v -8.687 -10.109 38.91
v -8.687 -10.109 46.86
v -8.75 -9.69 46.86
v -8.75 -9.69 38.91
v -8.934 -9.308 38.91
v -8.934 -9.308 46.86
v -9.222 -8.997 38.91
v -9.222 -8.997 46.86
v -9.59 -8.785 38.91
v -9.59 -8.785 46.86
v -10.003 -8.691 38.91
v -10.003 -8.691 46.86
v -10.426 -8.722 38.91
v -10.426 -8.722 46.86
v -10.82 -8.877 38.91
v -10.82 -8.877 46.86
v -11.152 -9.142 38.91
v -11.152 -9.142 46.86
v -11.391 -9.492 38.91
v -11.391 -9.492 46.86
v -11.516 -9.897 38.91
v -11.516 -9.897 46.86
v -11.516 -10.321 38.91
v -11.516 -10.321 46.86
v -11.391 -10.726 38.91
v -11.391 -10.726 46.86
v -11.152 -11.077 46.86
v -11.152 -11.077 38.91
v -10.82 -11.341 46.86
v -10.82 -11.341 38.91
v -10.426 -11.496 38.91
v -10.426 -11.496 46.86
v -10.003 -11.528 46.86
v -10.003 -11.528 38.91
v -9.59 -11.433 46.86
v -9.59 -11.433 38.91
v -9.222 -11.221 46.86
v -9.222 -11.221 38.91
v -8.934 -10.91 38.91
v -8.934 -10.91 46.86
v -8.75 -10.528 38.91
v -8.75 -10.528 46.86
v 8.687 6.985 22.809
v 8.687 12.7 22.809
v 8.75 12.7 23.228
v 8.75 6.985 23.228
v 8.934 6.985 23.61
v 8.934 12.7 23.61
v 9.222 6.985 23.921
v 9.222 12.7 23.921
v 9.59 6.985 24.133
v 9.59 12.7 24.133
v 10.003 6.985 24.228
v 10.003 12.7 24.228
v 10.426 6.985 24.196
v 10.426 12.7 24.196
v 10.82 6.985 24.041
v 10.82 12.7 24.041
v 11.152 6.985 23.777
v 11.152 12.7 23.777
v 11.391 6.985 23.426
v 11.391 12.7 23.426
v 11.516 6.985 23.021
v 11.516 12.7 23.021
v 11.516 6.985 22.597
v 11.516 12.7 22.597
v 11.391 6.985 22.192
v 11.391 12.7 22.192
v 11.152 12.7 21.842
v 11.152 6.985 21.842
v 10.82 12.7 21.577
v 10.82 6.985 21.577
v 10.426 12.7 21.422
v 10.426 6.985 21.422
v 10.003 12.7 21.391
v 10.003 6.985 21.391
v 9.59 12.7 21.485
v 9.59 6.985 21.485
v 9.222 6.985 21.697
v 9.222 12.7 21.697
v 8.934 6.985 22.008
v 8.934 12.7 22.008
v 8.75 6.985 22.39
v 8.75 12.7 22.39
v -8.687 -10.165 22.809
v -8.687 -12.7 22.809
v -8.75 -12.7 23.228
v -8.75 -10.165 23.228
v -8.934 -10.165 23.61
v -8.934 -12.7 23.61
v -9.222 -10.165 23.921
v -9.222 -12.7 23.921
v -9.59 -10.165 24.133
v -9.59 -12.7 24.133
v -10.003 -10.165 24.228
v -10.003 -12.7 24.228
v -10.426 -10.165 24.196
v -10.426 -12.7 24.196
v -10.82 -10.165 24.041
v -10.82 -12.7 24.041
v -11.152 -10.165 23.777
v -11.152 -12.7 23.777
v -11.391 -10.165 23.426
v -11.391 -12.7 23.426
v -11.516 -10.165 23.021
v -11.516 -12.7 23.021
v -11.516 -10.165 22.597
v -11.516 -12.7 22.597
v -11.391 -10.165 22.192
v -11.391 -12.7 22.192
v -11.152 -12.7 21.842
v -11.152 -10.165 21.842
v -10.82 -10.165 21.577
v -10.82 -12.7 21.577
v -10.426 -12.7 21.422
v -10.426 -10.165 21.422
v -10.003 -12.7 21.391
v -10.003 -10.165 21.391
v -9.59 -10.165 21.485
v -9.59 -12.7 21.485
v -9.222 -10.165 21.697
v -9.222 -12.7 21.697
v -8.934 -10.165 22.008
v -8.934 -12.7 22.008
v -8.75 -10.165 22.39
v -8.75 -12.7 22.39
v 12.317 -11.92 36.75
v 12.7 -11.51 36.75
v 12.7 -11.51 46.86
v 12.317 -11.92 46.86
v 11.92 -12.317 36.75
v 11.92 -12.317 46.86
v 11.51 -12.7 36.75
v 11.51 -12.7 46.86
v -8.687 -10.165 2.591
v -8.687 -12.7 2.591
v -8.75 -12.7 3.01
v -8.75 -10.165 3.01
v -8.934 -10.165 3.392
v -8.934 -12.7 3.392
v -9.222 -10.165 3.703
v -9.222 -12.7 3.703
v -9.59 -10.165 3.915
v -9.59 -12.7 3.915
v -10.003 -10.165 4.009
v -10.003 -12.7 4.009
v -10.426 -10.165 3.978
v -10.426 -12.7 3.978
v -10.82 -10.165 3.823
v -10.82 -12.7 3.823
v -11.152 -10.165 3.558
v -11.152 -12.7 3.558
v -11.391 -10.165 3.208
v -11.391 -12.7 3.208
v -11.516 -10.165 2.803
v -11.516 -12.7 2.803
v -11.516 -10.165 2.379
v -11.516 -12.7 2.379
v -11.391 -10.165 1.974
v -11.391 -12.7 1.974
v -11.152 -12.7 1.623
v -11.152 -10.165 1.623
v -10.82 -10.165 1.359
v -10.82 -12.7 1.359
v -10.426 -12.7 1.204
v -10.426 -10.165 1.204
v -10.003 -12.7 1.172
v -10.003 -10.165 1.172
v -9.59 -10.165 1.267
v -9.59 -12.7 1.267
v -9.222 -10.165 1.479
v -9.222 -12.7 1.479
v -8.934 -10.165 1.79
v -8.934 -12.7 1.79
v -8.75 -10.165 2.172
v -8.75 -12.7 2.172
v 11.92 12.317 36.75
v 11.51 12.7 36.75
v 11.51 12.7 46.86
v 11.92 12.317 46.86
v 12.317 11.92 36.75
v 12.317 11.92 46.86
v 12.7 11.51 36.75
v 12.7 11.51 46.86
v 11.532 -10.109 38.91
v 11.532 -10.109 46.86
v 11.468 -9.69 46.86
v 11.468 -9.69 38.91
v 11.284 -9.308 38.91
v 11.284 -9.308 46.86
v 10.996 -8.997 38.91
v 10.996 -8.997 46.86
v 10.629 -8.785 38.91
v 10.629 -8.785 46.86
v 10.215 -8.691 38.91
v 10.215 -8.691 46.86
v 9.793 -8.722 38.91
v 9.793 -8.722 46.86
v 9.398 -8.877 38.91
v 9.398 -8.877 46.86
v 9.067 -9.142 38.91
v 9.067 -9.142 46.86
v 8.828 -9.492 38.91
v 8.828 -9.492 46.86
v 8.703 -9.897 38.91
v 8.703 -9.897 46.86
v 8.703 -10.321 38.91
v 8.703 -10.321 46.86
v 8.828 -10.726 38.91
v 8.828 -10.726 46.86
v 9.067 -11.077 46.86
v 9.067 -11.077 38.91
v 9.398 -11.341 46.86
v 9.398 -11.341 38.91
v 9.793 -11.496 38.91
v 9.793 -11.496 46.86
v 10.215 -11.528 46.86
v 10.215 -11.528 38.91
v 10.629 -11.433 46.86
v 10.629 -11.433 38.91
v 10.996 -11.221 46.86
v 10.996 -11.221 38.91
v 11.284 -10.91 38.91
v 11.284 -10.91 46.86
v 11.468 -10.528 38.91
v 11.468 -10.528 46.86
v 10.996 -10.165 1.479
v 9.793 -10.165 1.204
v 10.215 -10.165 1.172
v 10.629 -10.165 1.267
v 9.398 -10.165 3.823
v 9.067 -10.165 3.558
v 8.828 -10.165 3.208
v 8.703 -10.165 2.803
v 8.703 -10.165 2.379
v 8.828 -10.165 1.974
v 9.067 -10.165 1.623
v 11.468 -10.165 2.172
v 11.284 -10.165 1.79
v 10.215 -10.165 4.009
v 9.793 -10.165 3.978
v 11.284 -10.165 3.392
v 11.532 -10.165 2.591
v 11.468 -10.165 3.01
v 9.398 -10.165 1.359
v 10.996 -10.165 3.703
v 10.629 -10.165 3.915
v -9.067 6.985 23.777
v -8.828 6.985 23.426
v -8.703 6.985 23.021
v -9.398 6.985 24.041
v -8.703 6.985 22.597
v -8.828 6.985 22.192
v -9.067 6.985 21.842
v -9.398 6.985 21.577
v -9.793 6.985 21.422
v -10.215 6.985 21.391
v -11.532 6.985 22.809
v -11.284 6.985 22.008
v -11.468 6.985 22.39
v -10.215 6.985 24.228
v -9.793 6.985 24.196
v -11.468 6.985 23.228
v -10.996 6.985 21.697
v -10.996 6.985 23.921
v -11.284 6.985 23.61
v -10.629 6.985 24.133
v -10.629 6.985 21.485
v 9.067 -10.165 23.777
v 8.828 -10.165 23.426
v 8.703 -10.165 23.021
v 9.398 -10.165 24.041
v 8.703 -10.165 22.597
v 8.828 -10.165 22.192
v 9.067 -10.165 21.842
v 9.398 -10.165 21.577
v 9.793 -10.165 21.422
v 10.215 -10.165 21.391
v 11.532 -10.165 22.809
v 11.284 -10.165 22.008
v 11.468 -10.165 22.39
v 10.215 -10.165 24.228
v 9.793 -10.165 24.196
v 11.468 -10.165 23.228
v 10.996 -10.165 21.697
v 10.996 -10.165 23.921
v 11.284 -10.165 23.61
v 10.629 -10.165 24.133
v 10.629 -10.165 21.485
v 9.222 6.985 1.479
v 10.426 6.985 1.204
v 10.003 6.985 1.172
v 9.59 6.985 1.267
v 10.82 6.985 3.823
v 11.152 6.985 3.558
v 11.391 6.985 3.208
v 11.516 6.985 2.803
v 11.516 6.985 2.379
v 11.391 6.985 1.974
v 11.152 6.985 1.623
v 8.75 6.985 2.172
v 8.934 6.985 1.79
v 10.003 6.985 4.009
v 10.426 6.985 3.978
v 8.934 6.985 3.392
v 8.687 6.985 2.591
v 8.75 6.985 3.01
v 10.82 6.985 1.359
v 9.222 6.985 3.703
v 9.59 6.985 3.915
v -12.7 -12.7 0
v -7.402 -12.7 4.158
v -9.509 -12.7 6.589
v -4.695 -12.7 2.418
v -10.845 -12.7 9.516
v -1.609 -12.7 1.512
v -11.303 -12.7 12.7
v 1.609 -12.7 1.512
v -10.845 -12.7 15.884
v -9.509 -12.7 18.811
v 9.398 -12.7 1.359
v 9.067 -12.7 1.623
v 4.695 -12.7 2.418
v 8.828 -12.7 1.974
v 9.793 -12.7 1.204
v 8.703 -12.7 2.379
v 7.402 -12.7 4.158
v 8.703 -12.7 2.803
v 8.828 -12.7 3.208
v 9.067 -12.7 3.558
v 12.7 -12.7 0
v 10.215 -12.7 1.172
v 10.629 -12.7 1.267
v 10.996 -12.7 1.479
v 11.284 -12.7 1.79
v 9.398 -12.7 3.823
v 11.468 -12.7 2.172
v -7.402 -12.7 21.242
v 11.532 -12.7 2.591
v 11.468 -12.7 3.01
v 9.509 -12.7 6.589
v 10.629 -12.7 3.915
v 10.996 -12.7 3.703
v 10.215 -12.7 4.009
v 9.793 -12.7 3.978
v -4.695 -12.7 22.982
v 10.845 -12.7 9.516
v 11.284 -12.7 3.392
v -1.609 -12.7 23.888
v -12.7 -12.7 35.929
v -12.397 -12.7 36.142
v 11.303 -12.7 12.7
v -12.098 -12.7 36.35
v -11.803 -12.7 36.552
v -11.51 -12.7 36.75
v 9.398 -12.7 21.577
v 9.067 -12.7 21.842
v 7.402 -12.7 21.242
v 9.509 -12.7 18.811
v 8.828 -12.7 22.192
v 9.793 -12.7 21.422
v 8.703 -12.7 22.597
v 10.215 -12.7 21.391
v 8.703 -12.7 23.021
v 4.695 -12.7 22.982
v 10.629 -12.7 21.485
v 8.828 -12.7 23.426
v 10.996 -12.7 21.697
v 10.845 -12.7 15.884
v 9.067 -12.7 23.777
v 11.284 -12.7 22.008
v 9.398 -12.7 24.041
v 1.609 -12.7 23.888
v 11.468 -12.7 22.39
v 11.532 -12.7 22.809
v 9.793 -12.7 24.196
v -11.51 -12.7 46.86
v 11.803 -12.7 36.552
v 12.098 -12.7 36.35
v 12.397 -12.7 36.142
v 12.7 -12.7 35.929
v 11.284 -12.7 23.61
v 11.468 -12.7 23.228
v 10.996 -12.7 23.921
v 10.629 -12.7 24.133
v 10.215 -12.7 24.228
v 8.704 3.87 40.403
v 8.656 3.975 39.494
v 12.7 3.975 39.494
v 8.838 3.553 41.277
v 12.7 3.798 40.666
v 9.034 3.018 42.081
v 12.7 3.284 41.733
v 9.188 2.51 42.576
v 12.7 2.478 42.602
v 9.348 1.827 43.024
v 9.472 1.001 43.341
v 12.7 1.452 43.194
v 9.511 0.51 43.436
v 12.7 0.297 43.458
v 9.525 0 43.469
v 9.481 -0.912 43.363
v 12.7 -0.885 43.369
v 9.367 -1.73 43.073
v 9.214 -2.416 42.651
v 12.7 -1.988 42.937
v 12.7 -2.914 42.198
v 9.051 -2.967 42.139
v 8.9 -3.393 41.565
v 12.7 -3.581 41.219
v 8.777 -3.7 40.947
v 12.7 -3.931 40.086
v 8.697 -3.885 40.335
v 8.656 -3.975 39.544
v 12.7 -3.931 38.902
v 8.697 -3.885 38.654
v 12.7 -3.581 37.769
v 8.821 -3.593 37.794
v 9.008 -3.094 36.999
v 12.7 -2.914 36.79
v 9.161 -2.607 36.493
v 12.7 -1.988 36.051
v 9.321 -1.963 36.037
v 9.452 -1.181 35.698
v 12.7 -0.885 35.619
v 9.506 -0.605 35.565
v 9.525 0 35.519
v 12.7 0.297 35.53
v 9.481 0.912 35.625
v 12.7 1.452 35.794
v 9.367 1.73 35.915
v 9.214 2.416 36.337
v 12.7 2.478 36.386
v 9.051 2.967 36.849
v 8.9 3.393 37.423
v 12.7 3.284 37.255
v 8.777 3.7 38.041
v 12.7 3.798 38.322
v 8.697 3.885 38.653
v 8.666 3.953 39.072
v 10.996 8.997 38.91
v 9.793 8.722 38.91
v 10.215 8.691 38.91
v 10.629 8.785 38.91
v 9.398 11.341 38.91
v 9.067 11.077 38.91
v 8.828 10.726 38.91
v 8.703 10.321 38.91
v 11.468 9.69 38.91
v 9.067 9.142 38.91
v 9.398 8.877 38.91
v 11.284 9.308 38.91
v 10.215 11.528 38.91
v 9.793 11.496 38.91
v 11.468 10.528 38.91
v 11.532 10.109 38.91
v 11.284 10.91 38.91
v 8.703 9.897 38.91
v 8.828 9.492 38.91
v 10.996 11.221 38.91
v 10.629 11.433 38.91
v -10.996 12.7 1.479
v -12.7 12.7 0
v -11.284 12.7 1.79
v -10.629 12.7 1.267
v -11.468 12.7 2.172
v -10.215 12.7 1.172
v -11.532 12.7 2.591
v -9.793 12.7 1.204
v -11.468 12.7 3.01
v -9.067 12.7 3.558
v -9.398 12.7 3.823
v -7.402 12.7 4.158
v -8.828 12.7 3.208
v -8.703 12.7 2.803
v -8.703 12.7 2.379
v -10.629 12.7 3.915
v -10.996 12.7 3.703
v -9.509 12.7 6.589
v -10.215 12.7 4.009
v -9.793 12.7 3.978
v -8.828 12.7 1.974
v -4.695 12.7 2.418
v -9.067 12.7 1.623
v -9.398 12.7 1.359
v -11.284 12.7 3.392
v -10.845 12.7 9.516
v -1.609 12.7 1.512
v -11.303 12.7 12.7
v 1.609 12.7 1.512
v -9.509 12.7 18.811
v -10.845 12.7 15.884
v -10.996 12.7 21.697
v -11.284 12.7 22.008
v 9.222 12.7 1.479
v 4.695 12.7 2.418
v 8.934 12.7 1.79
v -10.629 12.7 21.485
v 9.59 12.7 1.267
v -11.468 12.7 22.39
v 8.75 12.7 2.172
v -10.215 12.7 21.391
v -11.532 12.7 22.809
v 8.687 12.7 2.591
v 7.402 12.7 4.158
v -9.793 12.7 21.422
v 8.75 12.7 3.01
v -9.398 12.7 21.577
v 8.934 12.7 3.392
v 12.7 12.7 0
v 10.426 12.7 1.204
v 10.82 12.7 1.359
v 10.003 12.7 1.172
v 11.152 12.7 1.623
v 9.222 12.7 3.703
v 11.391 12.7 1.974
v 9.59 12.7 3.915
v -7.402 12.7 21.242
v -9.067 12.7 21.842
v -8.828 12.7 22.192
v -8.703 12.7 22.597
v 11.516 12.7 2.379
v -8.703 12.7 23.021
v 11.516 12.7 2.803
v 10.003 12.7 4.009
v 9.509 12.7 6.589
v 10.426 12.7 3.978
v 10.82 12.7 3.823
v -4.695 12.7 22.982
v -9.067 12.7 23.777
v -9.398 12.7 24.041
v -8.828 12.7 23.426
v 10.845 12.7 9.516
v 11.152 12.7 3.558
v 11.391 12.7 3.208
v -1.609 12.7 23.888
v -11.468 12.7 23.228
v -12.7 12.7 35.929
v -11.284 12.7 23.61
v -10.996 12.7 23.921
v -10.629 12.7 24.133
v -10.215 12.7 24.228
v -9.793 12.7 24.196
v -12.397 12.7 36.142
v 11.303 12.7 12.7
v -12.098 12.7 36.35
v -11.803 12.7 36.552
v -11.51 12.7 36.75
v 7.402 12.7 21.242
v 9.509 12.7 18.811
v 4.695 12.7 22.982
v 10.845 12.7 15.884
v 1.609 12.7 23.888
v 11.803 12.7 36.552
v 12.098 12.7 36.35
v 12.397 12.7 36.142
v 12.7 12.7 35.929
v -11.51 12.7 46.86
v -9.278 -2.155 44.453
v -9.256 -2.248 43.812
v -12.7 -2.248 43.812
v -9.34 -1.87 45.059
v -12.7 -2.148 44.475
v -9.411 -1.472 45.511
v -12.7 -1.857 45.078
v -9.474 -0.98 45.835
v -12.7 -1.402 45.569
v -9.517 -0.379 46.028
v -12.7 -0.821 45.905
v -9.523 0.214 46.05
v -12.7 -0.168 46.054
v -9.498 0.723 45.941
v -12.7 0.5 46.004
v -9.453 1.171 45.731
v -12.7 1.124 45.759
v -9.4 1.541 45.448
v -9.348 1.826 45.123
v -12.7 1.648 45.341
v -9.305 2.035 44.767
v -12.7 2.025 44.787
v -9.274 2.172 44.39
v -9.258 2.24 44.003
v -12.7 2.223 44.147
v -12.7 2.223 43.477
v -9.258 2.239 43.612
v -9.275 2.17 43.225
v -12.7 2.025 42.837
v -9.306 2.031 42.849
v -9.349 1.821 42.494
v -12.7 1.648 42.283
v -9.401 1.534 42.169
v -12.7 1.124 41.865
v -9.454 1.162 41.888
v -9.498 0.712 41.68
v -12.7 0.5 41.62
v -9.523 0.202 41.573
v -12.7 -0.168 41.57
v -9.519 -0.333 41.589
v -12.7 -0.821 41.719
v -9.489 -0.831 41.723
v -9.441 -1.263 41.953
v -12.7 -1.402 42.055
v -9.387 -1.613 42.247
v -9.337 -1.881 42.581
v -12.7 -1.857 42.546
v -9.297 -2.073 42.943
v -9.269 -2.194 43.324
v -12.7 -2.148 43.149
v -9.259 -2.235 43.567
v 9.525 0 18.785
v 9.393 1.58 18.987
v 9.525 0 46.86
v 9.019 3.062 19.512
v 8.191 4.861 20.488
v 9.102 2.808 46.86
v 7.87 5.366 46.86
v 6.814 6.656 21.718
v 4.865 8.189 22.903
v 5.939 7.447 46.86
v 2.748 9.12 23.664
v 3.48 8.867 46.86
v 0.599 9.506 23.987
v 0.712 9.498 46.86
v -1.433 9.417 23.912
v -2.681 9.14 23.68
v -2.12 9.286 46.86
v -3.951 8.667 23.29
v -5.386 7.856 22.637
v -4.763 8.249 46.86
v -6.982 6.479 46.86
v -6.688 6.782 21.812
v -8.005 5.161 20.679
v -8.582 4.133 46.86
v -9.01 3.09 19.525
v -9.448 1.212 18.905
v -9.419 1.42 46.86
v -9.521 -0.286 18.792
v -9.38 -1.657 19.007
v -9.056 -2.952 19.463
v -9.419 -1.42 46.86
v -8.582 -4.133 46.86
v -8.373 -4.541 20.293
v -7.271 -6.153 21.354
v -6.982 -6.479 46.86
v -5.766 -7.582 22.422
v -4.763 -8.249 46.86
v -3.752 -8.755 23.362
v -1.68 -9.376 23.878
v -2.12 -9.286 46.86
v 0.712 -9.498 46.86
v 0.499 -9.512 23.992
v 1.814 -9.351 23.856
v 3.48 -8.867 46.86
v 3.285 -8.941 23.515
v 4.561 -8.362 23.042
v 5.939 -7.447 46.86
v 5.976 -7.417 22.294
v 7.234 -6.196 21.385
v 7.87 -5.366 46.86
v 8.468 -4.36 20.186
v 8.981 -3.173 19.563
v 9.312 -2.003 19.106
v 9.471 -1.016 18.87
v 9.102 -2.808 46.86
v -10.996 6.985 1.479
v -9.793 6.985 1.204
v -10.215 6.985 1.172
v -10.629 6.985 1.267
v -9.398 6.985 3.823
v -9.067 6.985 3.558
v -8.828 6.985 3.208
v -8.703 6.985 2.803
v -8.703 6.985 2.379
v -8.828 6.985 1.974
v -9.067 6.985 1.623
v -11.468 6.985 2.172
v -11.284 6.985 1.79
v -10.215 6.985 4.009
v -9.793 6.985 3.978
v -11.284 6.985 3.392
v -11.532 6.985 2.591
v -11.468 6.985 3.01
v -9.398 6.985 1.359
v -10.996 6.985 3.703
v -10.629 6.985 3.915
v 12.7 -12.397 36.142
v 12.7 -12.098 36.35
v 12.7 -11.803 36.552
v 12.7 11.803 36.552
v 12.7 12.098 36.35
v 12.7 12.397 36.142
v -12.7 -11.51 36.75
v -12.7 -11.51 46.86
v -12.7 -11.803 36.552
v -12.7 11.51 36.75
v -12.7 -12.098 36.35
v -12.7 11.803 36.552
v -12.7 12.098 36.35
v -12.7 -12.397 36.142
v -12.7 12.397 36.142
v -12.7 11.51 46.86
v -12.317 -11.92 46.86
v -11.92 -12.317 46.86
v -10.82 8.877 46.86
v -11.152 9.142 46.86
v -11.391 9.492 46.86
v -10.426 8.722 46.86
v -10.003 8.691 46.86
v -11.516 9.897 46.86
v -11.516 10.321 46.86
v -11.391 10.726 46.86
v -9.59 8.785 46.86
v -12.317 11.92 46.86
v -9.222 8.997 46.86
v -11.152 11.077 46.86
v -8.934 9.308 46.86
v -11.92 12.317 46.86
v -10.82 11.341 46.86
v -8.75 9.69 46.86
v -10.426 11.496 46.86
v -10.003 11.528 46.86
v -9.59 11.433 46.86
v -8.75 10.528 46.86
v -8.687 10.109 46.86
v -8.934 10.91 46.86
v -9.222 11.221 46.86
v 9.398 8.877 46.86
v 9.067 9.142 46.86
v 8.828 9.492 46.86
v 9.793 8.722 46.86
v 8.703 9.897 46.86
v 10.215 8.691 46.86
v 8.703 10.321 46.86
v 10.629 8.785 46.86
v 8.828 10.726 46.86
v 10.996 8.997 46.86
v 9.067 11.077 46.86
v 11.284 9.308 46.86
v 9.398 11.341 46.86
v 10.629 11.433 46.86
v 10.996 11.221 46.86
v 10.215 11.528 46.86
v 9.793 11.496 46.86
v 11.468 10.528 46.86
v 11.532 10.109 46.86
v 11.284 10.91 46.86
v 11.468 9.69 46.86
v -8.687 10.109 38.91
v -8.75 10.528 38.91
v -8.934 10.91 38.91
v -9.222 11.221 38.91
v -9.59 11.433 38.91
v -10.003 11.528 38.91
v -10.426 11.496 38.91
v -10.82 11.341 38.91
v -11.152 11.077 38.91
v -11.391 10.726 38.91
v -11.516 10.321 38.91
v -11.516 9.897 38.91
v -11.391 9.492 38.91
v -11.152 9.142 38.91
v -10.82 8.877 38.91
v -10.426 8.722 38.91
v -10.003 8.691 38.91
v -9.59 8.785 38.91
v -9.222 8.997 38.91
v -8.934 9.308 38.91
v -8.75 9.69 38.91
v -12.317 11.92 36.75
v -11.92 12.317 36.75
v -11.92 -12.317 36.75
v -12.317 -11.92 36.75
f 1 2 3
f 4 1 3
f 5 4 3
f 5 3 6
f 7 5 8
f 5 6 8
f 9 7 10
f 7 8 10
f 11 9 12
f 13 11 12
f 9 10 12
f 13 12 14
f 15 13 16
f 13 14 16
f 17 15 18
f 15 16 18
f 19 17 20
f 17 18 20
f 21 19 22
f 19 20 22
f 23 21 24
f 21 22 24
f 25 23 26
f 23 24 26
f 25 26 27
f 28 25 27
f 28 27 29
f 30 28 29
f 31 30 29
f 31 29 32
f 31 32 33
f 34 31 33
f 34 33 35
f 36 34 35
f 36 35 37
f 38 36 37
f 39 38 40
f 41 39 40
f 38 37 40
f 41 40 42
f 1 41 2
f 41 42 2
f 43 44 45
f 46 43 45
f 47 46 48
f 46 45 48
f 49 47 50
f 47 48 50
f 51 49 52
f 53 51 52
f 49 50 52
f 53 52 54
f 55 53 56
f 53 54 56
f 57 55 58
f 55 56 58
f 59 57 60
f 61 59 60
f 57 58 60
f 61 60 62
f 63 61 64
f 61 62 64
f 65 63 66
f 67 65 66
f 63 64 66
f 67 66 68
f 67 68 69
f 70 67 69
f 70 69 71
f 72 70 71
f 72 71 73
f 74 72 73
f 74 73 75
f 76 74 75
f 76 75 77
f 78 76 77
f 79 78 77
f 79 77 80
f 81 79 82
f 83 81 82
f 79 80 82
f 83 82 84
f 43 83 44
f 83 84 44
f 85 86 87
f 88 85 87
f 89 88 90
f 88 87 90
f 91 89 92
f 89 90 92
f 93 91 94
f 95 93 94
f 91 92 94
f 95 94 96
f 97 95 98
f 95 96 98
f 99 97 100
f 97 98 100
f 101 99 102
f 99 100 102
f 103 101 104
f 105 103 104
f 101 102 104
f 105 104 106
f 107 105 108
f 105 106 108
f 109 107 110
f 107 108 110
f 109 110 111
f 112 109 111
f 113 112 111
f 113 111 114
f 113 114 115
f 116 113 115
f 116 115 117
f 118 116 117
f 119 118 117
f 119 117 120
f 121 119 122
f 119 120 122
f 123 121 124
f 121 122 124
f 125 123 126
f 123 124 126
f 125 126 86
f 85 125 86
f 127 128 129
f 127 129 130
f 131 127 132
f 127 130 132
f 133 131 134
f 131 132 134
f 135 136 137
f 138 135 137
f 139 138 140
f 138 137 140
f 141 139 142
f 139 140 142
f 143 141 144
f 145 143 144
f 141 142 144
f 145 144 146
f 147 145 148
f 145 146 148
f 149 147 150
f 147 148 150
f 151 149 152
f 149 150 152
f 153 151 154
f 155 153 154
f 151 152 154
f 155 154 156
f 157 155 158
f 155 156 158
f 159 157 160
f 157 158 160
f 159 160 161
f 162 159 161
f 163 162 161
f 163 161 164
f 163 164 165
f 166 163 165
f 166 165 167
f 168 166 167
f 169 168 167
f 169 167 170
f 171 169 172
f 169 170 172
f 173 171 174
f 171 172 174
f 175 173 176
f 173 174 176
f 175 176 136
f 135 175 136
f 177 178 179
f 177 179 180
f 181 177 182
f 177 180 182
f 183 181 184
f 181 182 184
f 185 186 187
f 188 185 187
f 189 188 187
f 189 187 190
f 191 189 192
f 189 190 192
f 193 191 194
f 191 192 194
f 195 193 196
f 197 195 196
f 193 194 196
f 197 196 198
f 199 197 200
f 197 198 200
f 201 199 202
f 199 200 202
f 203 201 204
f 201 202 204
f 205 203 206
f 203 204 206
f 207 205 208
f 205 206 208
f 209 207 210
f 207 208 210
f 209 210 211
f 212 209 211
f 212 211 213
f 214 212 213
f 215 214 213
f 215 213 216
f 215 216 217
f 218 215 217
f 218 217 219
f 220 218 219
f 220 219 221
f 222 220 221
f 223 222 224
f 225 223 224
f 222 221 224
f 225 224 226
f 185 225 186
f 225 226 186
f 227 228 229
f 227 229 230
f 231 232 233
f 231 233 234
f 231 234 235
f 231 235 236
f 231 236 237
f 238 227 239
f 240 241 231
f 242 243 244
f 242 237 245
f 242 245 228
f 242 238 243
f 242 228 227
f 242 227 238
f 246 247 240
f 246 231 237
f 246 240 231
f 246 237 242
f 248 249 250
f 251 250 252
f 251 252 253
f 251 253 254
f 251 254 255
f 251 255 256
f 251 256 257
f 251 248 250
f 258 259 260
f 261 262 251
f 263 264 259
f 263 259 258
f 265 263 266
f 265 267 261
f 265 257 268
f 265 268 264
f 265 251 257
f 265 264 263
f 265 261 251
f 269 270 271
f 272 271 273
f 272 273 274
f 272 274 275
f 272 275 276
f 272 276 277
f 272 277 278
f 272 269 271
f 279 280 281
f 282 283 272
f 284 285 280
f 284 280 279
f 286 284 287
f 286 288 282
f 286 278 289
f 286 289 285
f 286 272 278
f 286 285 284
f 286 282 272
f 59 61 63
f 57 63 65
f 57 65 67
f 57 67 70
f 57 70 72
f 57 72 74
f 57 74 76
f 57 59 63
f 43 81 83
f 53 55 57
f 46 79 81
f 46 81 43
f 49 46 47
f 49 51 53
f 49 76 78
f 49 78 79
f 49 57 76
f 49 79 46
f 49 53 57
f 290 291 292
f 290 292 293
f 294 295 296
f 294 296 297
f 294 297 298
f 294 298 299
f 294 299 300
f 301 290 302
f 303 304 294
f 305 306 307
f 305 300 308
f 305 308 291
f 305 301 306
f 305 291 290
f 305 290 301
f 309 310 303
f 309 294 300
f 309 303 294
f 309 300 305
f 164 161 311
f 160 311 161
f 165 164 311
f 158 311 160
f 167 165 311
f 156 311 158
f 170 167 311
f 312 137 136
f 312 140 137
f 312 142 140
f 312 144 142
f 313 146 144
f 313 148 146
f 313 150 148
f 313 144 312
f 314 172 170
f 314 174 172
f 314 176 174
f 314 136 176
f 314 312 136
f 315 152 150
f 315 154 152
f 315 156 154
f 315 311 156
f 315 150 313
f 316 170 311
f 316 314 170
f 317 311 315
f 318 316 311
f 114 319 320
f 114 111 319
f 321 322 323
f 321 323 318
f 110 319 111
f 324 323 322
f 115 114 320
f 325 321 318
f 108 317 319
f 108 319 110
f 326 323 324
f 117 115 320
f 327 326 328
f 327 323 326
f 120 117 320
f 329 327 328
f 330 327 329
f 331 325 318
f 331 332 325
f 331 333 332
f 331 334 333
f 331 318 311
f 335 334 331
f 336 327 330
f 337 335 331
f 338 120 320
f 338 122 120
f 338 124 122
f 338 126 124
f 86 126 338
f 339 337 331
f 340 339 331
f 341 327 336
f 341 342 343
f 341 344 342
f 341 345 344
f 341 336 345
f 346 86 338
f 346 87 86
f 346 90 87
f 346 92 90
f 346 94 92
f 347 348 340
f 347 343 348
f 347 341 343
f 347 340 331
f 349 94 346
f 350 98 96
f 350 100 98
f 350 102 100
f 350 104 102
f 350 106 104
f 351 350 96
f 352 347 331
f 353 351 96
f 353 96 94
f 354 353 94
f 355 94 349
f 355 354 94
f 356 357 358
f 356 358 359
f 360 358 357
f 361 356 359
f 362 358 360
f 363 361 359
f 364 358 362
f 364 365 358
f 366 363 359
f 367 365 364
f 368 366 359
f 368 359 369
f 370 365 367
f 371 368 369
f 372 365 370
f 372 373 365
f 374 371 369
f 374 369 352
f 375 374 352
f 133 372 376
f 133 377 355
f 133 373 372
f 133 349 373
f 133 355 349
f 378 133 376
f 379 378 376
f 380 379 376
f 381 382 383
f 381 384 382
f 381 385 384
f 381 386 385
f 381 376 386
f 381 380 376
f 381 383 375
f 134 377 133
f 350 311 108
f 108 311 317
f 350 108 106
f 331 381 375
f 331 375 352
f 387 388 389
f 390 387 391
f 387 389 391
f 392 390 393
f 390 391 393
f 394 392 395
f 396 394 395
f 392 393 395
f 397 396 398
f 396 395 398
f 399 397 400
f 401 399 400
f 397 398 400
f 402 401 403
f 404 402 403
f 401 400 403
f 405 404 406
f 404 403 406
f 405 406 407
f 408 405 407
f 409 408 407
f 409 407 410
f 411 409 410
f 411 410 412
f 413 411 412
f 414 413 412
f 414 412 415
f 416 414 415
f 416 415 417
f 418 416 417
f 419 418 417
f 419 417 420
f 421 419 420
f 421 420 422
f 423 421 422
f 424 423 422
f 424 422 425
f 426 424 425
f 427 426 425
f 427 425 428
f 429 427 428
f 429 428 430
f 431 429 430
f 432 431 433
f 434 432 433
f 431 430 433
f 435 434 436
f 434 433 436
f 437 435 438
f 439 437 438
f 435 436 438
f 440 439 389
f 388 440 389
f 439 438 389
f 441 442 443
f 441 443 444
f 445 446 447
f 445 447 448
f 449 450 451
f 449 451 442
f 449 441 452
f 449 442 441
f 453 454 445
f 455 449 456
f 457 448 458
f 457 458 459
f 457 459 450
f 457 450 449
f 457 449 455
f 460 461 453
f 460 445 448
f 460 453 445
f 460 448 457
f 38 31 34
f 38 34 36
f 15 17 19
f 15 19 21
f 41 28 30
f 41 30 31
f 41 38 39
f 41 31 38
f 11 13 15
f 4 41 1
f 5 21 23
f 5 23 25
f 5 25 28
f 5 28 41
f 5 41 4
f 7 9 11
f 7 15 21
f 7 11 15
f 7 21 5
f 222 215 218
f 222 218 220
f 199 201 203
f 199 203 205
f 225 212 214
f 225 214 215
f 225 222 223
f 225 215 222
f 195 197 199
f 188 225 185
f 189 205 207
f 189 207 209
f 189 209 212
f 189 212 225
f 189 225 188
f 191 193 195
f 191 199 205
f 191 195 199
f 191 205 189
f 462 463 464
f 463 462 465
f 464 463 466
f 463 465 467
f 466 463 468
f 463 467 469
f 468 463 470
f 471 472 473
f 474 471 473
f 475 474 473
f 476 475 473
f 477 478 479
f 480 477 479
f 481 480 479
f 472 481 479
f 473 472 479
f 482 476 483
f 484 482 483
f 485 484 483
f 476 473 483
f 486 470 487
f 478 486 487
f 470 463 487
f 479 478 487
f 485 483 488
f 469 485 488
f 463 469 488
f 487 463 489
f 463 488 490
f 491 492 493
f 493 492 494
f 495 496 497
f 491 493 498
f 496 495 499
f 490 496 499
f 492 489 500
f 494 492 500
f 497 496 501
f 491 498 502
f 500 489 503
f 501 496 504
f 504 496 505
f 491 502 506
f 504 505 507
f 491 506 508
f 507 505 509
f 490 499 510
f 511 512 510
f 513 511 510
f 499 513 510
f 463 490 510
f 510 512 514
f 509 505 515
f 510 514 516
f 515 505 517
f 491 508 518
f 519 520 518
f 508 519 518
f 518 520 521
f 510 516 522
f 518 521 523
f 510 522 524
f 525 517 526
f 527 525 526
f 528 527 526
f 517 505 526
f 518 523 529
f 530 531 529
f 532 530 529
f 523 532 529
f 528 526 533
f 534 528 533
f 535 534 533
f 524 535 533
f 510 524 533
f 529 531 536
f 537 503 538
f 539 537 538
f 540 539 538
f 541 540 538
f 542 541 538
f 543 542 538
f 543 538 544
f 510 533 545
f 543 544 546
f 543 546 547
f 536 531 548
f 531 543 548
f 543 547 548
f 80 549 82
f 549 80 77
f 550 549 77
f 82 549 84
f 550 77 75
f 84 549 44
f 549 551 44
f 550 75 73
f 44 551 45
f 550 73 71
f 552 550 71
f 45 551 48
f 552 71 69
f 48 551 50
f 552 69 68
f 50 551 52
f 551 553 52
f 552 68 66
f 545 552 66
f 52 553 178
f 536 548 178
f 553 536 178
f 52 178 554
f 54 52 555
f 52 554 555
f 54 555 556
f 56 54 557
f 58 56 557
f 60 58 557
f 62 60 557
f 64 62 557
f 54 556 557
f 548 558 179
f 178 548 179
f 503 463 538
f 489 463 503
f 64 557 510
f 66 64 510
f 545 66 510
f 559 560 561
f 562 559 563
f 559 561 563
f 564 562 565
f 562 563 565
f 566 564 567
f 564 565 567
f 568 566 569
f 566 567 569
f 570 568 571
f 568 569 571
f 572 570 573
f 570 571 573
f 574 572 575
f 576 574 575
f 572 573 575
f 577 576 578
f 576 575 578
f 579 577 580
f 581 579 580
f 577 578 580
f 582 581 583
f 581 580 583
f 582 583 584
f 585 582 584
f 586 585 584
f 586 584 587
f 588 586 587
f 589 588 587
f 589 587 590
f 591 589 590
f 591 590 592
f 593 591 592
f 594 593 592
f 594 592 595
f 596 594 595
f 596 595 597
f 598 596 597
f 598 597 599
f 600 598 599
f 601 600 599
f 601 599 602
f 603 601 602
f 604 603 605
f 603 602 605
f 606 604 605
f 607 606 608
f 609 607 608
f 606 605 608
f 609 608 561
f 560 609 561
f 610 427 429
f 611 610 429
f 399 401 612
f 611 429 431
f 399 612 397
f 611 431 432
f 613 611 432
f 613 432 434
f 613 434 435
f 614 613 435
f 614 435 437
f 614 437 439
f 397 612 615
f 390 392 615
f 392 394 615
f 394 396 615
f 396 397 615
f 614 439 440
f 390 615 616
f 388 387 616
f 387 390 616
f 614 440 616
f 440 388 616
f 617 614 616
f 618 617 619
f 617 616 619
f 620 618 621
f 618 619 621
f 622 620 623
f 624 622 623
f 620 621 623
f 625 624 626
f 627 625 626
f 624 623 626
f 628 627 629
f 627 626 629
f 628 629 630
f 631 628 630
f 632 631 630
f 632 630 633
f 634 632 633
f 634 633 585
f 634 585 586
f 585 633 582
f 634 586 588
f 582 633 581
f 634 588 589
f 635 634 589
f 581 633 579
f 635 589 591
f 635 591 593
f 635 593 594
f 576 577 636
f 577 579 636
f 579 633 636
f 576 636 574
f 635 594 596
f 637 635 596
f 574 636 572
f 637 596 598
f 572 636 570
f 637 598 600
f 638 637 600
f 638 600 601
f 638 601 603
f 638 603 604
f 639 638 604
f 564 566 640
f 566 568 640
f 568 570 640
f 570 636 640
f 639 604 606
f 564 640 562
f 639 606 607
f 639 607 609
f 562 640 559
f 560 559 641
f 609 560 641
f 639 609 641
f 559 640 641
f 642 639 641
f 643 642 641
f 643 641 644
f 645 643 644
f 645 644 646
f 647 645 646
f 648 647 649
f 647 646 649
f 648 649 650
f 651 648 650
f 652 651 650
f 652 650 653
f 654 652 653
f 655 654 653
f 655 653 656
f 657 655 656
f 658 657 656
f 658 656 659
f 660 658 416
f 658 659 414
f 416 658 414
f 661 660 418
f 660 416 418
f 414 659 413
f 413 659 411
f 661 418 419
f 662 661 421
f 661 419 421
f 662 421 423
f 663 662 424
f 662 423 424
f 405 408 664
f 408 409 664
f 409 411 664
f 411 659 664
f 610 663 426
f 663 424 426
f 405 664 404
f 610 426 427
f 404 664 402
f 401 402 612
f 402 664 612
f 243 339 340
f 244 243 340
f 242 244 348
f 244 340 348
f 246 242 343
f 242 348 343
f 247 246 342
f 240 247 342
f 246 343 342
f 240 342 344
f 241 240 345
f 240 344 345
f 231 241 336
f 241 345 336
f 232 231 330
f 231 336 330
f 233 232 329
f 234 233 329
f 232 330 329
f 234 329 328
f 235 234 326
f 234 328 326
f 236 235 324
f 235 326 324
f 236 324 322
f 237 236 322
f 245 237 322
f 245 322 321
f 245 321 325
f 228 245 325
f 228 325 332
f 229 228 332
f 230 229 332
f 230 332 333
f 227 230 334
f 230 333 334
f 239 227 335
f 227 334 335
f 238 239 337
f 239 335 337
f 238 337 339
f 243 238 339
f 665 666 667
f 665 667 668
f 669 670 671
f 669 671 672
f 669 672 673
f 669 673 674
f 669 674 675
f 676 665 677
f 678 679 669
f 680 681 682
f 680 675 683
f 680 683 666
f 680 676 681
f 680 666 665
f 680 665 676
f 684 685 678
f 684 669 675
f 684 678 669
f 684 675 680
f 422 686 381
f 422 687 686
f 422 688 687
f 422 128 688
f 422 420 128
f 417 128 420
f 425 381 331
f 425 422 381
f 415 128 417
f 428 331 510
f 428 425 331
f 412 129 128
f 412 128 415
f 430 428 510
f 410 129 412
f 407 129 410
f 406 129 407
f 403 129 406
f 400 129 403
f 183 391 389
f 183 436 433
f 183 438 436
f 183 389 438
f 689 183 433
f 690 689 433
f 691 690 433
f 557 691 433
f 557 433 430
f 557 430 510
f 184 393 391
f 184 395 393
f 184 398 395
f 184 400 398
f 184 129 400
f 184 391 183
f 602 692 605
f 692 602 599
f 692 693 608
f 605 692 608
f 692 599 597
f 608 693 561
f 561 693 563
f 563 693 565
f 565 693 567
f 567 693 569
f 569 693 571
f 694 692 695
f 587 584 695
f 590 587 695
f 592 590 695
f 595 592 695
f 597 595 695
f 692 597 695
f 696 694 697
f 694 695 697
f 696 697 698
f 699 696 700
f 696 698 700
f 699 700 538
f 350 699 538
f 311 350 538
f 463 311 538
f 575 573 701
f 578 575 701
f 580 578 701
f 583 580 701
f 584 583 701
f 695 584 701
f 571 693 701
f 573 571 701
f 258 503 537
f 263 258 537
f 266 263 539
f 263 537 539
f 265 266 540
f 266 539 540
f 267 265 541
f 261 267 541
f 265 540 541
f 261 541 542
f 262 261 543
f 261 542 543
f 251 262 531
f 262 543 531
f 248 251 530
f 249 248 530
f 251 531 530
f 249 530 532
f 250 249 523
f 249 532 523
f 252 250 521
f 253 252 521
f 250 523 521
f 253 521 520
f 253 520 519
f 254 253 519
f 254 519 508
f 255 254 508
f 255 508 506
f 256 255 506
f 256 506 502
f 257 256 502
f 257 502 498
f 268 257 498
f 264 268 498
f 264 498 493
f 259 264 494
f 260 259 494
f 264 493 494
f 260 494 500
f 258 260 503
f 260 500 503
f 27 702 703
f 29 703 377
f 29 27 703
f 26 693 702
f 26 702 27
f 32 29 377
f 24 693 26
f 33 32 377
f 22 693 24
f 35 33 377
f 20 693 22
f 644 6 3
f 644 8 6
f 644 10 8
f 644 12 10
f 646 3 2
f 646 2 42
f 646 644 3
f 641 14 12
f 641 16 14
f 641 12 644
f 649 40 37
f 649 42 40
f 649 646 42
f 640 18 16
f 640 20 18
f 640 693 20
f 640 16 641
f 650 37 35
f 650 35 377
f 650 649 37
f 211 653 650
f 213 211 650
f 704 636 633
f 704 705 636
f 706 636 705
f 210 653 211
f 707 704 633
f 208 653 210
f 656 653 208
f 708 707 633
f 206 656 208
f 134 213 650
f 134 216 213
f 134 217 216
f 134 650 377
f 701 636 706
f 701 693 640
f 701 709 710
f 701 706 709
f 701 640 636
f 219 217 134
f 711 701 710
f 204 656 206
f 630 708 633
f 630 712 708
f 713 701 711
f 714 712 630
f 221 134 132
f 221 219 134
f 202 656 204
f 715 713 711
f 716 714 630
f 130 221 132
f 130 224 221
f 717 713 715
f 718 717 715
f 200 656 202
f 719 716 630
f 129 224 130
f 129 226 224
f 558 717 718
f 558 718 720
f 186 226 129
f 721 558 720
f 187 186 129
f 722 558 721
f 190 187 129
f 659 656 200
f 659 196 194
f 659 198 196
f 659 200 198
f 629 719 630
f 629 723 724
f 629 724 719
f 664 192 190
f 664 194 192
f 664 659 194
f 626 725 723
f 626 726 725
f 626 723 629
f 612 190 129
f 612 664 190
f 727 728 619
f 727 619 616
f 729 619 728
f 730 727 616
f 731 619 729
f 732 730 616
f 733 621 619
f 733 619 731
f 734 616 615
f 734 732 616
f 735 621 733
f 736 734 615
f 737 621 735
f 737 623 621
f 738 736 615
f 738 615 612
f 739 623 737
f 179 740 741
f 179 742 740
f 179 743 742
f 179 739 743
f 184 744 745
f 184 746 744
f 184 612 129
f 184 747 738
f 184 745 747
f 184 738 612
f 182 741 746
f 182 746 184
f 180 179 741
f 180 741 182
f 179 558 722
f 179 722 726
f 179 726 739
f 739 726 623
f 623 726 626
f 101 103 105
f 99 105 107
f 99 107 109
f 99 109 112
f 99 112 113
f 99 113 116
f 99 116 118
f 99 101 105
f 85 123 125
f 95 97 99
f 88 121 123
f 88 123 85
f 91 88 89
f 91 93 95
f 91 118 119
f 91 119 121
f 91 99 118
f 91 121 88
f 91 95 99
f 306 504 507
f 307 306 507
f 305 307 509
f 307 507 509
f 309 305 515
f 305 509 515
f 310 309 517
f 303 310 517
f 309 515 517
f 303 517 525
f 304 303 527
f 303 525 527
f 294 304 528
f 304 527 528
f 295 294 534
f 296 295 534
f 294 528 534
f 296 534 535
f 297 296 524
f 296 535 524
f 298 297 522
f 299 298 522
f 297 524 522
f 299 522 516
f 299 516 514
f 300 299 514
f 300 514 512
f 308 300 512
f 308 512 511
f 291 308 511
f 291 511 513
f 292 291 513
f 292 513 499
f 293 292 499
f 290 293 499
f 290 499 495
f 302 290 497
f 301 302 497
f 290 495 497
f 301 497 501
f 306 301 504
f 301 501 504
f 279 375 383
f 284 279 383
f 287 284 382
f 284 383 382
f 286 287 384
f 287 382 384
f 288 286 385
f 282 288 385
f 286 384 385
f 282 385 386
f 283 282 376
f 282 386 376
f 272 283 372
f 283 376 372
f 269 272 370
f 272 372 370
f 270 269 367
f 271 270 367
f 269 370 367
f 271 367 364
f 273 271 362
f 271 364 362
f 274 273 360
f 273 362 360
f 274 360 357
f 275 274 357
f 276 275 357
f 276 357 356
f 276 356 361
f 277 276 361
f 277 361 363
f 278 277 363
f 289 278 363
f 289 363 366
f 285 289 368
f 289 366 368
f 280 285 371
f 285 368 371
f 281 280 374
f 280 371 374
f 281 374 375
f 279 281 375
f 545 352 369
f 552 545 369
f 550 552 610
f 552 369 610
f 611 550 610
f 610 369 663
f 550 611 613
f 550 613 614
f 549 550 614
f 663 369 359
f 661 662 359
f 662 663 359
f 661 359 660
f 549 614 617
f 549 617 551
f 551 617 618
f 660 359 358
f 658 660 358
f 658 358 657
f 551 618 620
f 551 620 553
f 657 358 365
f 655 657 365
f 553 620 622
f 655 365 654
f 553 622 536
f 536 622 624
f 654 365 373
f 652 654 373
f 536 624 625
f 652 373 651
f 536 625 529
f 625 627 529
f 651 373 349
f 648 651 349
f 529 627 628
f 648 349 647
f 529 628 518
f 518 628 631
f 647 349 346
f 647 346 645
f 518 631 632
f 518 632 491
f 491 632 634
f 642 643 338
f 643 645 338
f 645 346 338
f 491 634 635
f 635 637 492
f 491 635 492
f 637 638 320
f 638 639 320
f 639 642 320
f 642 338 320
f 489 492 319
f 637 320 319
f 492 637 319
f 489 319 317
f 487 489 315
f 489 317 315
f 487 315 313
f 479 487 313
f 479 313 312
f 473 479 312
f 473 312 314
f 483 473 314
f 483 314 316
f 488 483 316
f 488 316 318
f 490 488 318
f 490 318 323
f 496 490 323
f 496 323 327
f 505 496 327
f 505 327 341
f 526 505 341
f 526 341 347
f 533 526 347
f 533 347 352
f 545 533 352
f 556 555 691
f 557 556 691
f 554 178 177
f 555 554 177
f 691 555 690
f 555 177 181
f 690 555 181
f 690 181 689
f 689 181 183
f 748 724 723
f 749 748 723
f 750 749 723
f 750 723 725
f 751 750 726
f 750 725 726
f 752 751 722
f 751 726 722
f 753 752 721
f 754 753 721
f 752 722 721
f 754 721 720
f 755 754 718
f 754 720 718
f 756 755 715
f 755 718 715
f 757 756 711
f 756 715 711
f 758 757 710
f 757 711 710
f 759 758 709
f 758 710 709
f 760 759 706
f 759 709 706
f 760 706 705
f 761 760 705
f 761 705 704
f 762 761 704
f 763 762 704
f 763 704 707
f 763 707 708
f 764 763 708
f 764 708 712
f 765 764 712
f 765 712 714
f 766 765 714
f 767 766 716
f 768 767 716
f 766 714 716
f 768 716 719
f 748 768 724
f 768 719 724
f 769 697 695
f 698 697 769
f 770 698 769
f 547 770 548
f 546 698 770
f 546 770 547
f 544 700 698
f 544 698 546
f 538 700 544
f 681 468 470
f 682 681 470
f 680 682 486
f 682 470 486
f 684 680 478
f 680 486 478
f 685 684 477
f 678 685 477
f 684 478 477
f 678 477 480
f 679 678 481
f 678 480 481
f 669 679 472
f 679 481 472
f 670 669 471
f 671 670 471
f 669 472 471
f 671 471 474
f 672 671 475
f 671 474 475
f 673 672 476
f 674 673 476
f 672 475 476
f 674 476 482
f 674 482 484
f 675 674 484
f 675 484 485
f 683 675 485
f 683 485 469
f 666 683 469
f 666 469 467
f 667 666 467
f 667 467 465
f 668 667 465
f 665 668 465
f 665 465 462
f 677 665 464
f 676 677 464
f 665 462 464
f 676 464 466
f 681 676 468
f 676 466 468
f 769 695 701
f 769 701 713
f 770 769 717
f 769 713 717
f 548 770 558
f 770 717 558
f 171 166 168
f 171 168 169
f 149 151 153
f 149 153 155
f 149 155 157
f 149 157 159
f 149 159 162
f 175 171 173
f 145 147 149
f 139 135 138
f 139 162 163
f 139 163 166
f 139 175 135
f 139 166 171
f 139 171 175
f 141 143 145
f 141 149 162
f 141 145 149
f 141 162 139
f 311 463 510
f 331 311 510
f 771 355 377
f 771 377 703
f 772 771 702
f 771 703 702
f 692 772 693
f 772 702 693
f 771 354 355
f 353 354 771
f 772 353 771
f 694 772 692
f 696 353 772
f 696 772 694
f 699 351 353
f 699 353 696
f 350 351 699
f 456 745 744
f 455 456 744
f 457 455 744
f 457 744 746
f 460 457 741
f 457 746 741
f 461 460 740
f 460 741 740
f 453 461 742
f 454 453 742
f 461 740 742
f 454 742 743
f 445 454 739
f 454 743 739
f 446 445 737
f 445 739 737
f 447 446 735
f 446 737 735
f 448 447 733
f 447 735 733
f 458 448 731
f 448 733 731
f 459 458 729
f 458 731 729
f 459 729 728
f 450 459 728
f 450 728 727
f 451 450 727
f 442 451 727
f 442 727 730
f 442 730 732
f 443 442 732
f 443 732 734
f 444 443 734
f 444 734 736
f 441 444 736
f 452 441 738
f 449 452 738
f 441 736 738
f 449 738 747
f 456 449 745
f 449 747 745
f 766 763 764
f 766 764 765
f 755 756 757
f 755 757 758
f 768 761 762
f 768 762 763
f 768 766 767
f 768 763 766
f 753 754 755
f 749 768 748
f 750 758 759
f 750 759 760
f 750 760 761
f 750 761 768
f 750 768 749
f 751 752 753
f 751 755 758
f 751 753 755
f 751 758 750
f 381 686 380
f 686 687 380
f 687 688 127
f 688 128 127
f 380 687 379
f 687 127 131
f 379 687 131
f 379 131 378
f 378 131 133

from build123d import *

# Parameters (mm, degrees)
F0_W         = 25.4
F0_H         = 25.4
F1_DEPTH     = 46.86
F3_DEPTH     = 11.11
F4_T4_ANGLE  = 22.8192997927
F4_T10_ANGLE = 22.8192997927
F4_T16_ANGLE = 22.8192997927
F4_T22_ANGLE = 22.8192997927
F5_R         = 2.2479
F6_DEPTH     = 6.4371526241
F8_R         = 9.525
F9_DEPTH     = 31.75
F10_R        = 1.4224
F11_DEPTH    = 7.9502
F7_R         = 11.303
F12_DEPTH    = 25.401
F7_R_2       = 1.4224
F13_DEPTH    = 2.5348692
F14_R        = 3.9751
F15_DEPTH    = 6.35
F16_R        = 1.4224
F17_DEPTH    = 5.715


# Not quite as in the source:
# - a fillet or chamfer that OpenCascade refuses, or shapes differently, is made with other operations: its cross-section is extruded or revolved along the edge and cut away or added


with BuildPart() as f1:
    # F0 (on Top) → F1 (new body)
    with BuildSketch(Plane.XY):
        Rectangle(F0_W, F0_H)
    extrude(amount=F1_DEPTH)

    # F2 (on face) → F3 (cut)
    with BuildSketch(Plane.XY.offset(46.86)):
        with BuildLine():
            ThreePointArc((-11.5104126772, -12.7), (-12.1198102295, -12.1198102295), (-12.7, -11.5104126772))
            Line((-12.7, -11.5104126772), (-12.7, -12.7))
            Line((-12.7, -12.7), (-11.5104126772, -12.7))
        make_face()
        with BuildLine():
            ThreePointArc((-12.7, 11.5104126772), (-12.1198102295, 12.1198102295), (-11.5104126772, 12.7))
            Line((-11.5104126772, 12.7), (-12.7, 12.7))
            Line((-12.7, 12.7), (-12.7, 11.5104126772))
        make_face()
        with BuildLine():
            Line((12.7, 12.7), (11.5104126772, 12.7))
            ThreePointArc((11.5104126772, 12.7), (12.1198102295, 12.1198102295), (12.7, 11.5104126772))
            Line((12.7, 11.5104126772), (12.7, 12.7))
        make_face()
        with BuildLine():
            Line((12.7, -12.7), (12.7, -11.5104126772))
            ThreePointArc((12.7, -11.5104126772), (12.1198102295, -12.1198102295), (11.5104126772, -12.7))
            Line((11.5104126772, -12.7), (12.7, -12.7))
        make_face()
    extrude(amount=-F3_DEPTH, mode=Mode.SUBTRACT)

    # F4: chamfer of 1 on 4 edges, made by hand


with BuildPart() as f4_tool2:
    # F4_s3 → F4_t4 (revolve)
    with BuildSketch(Plane(origin=(0, 0, 0), x_dir=(0, 0, 1), z_dir=(0.8330144325, -0.5532512587, 0))):
        Polygon((36.75, 17.14), (35.75, 18.14), (35.75, 17.14), align=None)
    revolve(axis=Axis((0, 0, 35.75), (0, 0, -1)), revolution_arc=F4_T4_ANGLE)

    split(bisect_by=Plane.XZ.offset(12.7), keep=Keep.BOTTOM)

    split(bisect_by=Plane.YZ.offset(-12.7), keep=Keep.TOP)


with BuildPart() as f1_1:
    add(f1.part)

    # F4_t1: union F4_tool2
    add(f4_tool2.part)


with BuildPart() as f4_tool8:
    # F4_s9 → F4_t10 (revolve)
    with BuildSketch(Plane(origin=(0, 0, 0), x_dir=(0, 0, 1), z_dir=(0.5532512587, 0.8330144325, 0))):
        Polygon((35.75, 18.14), (36.75, 17.14), (35.75, 17.14), align=None)
    revolve(axis=Axis((0, 0, 35.75), (0, 0, -1)), revolution_arc=F4_T10_ANGLE)

    split(bisect_by=Plane.XZ.offset(12.7), keep=Keep.BOTTOM)

    split(bisect_by=Plane.YZ.offset(12.7), keep=Keep.BOTTOM)


with BuildPart() as f1_2:
    add(f1_1.part)

    # F4_t7: union F4_tool8
    add(f4_tool8.part)


with BuildPart() as f4_tool14:
    # F4_s15 → F4_t16 (revolve)
    with BuildSketch(Plane(origin=(0, 0, 0), x_dir=(0, 0, 1), z_dir=(-0.8330144325, 0.5532512587, 0))):
        Polygon((35.75, 18.14), (36.75, 17.14), (35.75, 17.14), align=None)
    revolve(axis=Axis((0, 0, 35.75), (0, 0, -1)), revolution_arc=F4_T16_ANGLE)

    split(bisect_by=Plane.YZ.offset(12.7), keep=Keep.BOTTOM)

    split(bisect_by=Plane.XZ.offset(-12.7), keep=Keep.TOP)


with BuildPart() as f1_3:
    add(f1_2.part)

    # F4_t13: union F4_tool14
    add(f4_tool14.part)


with BuildPart() as f4_tool20:
    # F4_s21 → F4_t22 (revolve)
    with BuildSketch(Plane(origin=(0, 0, 0), x_dir=(0, 0, 1), z_dir=(-0.5532512587, -0.8330144325, 0))):
        Polygon((36.75, 17.14), (35.75, 18.14), (35.75, 17.14), align=None)
    revolve(axis=Axis((0, 0, 35.75), (0, 0, -1)), revolution_arc=F4_T22_ANGLE)

    split(bisect_by=Plane.YZ.offset(-12.7), keep=Keep.TOP)

    split(bisect_by=Plane.XZ.offset(-12.7), keep=Keep.TOP)


with BuildPart() as f1_4:
    add(f1_3.part)

    # F4_t19: union F4_tool20
    add(f4_tool20.part)

    # F5 (on face) → F6 (cut)
    with BuildSketch(Plane(origin=(-12.7, 0, 0), x_dir=(0, -1, 0), z_dir=(-1, 0, 0))):
        with Locations((0, 43.812)):
            Circle(F5_R)
    extrude(amount=-F6_DEPTH, mode=Mode.SUBTRACT)

    # F8 (on face) → F9 (cut)
    with BuildSketch(Plane.XY.offset(46.86)):
        Circle(F8_R)
    extrude(amount=-F9_DEPTH, mode=Mode.SUBTRACT)

    # F10 (on face) → F11 (cut)
    with BuildSketch(Plane.XY.offset(46.86)):
        with Locations((10.1092, -10.1092)):
            Circle(F10_R)
        with Locations((10.1092, 10.1092)):
            Circle(F10_R)
        with Locations((-10.1092, 10.1092)):
            Circle(F10_R)
        with Locations((-10.1092, -10.1092)):
            Circle(F10_R)
    extrude(amount=-F11_DEPTH, mode=Mode.SUBTRACT)

    # F7 (on face) → F12 (cut, through all)
    with BuildSketch(Plane.XZ.offset(12.7)):
        with Locations((0, 12.7)):
            Circle(F7_R)
    extrude(amount=-F12_DEPTH, mode=Mode.SUBTRACT)

    # F7 (on face) → F13 (cut)
    with BuildSketch(Plane.XZ.offset(12.7)):
        with Locations((10.1092, 22.8092)):
            Circle(F7_R_2)
        with Locations((10.1092, 2.5908)):
            Circle(F7_R_2)
        with Locations((-10.1092, 2.5908)):
            Circle(F7_R_2)
        with Locations((-10.1092, 22.8092)):
            Circle(F7_R_2)
    extrude(amount=-F13_DEPTH, mode=Mode.SUBTRACT)

    # F14 (on face) → F15 (cut)
    with BuildSketch(Plane.YZ.offset(12.7)):
        with Locations((0, 39.494)):
            Circle(F14_R)
    extrude(amount=-F15_DEPTH, mode=Mode.SUBTRACT)

    # F16 (on face) → F17 (cut)
    with BuildSketch(Plane(origin=(0, 12.7, 0), x_dir=(-1, 0, 0), z_dir=(0, 1, 0))):
        with Locations((-10.1092, 22.8092)):
            Circle(F16_R)
        with Locations((10.1092, 22.8092)):
            Circle(F16_R)
        with Locations((10.1092, 2.5908)):
            Circle(F16_R)
        with Locations((-10.1092, 2.5908)):
            Circle(F16_R)
    extrude(amount=-F17_DEPTH, mode=Mode.SUBTRACT)


solid = f1_4.part
